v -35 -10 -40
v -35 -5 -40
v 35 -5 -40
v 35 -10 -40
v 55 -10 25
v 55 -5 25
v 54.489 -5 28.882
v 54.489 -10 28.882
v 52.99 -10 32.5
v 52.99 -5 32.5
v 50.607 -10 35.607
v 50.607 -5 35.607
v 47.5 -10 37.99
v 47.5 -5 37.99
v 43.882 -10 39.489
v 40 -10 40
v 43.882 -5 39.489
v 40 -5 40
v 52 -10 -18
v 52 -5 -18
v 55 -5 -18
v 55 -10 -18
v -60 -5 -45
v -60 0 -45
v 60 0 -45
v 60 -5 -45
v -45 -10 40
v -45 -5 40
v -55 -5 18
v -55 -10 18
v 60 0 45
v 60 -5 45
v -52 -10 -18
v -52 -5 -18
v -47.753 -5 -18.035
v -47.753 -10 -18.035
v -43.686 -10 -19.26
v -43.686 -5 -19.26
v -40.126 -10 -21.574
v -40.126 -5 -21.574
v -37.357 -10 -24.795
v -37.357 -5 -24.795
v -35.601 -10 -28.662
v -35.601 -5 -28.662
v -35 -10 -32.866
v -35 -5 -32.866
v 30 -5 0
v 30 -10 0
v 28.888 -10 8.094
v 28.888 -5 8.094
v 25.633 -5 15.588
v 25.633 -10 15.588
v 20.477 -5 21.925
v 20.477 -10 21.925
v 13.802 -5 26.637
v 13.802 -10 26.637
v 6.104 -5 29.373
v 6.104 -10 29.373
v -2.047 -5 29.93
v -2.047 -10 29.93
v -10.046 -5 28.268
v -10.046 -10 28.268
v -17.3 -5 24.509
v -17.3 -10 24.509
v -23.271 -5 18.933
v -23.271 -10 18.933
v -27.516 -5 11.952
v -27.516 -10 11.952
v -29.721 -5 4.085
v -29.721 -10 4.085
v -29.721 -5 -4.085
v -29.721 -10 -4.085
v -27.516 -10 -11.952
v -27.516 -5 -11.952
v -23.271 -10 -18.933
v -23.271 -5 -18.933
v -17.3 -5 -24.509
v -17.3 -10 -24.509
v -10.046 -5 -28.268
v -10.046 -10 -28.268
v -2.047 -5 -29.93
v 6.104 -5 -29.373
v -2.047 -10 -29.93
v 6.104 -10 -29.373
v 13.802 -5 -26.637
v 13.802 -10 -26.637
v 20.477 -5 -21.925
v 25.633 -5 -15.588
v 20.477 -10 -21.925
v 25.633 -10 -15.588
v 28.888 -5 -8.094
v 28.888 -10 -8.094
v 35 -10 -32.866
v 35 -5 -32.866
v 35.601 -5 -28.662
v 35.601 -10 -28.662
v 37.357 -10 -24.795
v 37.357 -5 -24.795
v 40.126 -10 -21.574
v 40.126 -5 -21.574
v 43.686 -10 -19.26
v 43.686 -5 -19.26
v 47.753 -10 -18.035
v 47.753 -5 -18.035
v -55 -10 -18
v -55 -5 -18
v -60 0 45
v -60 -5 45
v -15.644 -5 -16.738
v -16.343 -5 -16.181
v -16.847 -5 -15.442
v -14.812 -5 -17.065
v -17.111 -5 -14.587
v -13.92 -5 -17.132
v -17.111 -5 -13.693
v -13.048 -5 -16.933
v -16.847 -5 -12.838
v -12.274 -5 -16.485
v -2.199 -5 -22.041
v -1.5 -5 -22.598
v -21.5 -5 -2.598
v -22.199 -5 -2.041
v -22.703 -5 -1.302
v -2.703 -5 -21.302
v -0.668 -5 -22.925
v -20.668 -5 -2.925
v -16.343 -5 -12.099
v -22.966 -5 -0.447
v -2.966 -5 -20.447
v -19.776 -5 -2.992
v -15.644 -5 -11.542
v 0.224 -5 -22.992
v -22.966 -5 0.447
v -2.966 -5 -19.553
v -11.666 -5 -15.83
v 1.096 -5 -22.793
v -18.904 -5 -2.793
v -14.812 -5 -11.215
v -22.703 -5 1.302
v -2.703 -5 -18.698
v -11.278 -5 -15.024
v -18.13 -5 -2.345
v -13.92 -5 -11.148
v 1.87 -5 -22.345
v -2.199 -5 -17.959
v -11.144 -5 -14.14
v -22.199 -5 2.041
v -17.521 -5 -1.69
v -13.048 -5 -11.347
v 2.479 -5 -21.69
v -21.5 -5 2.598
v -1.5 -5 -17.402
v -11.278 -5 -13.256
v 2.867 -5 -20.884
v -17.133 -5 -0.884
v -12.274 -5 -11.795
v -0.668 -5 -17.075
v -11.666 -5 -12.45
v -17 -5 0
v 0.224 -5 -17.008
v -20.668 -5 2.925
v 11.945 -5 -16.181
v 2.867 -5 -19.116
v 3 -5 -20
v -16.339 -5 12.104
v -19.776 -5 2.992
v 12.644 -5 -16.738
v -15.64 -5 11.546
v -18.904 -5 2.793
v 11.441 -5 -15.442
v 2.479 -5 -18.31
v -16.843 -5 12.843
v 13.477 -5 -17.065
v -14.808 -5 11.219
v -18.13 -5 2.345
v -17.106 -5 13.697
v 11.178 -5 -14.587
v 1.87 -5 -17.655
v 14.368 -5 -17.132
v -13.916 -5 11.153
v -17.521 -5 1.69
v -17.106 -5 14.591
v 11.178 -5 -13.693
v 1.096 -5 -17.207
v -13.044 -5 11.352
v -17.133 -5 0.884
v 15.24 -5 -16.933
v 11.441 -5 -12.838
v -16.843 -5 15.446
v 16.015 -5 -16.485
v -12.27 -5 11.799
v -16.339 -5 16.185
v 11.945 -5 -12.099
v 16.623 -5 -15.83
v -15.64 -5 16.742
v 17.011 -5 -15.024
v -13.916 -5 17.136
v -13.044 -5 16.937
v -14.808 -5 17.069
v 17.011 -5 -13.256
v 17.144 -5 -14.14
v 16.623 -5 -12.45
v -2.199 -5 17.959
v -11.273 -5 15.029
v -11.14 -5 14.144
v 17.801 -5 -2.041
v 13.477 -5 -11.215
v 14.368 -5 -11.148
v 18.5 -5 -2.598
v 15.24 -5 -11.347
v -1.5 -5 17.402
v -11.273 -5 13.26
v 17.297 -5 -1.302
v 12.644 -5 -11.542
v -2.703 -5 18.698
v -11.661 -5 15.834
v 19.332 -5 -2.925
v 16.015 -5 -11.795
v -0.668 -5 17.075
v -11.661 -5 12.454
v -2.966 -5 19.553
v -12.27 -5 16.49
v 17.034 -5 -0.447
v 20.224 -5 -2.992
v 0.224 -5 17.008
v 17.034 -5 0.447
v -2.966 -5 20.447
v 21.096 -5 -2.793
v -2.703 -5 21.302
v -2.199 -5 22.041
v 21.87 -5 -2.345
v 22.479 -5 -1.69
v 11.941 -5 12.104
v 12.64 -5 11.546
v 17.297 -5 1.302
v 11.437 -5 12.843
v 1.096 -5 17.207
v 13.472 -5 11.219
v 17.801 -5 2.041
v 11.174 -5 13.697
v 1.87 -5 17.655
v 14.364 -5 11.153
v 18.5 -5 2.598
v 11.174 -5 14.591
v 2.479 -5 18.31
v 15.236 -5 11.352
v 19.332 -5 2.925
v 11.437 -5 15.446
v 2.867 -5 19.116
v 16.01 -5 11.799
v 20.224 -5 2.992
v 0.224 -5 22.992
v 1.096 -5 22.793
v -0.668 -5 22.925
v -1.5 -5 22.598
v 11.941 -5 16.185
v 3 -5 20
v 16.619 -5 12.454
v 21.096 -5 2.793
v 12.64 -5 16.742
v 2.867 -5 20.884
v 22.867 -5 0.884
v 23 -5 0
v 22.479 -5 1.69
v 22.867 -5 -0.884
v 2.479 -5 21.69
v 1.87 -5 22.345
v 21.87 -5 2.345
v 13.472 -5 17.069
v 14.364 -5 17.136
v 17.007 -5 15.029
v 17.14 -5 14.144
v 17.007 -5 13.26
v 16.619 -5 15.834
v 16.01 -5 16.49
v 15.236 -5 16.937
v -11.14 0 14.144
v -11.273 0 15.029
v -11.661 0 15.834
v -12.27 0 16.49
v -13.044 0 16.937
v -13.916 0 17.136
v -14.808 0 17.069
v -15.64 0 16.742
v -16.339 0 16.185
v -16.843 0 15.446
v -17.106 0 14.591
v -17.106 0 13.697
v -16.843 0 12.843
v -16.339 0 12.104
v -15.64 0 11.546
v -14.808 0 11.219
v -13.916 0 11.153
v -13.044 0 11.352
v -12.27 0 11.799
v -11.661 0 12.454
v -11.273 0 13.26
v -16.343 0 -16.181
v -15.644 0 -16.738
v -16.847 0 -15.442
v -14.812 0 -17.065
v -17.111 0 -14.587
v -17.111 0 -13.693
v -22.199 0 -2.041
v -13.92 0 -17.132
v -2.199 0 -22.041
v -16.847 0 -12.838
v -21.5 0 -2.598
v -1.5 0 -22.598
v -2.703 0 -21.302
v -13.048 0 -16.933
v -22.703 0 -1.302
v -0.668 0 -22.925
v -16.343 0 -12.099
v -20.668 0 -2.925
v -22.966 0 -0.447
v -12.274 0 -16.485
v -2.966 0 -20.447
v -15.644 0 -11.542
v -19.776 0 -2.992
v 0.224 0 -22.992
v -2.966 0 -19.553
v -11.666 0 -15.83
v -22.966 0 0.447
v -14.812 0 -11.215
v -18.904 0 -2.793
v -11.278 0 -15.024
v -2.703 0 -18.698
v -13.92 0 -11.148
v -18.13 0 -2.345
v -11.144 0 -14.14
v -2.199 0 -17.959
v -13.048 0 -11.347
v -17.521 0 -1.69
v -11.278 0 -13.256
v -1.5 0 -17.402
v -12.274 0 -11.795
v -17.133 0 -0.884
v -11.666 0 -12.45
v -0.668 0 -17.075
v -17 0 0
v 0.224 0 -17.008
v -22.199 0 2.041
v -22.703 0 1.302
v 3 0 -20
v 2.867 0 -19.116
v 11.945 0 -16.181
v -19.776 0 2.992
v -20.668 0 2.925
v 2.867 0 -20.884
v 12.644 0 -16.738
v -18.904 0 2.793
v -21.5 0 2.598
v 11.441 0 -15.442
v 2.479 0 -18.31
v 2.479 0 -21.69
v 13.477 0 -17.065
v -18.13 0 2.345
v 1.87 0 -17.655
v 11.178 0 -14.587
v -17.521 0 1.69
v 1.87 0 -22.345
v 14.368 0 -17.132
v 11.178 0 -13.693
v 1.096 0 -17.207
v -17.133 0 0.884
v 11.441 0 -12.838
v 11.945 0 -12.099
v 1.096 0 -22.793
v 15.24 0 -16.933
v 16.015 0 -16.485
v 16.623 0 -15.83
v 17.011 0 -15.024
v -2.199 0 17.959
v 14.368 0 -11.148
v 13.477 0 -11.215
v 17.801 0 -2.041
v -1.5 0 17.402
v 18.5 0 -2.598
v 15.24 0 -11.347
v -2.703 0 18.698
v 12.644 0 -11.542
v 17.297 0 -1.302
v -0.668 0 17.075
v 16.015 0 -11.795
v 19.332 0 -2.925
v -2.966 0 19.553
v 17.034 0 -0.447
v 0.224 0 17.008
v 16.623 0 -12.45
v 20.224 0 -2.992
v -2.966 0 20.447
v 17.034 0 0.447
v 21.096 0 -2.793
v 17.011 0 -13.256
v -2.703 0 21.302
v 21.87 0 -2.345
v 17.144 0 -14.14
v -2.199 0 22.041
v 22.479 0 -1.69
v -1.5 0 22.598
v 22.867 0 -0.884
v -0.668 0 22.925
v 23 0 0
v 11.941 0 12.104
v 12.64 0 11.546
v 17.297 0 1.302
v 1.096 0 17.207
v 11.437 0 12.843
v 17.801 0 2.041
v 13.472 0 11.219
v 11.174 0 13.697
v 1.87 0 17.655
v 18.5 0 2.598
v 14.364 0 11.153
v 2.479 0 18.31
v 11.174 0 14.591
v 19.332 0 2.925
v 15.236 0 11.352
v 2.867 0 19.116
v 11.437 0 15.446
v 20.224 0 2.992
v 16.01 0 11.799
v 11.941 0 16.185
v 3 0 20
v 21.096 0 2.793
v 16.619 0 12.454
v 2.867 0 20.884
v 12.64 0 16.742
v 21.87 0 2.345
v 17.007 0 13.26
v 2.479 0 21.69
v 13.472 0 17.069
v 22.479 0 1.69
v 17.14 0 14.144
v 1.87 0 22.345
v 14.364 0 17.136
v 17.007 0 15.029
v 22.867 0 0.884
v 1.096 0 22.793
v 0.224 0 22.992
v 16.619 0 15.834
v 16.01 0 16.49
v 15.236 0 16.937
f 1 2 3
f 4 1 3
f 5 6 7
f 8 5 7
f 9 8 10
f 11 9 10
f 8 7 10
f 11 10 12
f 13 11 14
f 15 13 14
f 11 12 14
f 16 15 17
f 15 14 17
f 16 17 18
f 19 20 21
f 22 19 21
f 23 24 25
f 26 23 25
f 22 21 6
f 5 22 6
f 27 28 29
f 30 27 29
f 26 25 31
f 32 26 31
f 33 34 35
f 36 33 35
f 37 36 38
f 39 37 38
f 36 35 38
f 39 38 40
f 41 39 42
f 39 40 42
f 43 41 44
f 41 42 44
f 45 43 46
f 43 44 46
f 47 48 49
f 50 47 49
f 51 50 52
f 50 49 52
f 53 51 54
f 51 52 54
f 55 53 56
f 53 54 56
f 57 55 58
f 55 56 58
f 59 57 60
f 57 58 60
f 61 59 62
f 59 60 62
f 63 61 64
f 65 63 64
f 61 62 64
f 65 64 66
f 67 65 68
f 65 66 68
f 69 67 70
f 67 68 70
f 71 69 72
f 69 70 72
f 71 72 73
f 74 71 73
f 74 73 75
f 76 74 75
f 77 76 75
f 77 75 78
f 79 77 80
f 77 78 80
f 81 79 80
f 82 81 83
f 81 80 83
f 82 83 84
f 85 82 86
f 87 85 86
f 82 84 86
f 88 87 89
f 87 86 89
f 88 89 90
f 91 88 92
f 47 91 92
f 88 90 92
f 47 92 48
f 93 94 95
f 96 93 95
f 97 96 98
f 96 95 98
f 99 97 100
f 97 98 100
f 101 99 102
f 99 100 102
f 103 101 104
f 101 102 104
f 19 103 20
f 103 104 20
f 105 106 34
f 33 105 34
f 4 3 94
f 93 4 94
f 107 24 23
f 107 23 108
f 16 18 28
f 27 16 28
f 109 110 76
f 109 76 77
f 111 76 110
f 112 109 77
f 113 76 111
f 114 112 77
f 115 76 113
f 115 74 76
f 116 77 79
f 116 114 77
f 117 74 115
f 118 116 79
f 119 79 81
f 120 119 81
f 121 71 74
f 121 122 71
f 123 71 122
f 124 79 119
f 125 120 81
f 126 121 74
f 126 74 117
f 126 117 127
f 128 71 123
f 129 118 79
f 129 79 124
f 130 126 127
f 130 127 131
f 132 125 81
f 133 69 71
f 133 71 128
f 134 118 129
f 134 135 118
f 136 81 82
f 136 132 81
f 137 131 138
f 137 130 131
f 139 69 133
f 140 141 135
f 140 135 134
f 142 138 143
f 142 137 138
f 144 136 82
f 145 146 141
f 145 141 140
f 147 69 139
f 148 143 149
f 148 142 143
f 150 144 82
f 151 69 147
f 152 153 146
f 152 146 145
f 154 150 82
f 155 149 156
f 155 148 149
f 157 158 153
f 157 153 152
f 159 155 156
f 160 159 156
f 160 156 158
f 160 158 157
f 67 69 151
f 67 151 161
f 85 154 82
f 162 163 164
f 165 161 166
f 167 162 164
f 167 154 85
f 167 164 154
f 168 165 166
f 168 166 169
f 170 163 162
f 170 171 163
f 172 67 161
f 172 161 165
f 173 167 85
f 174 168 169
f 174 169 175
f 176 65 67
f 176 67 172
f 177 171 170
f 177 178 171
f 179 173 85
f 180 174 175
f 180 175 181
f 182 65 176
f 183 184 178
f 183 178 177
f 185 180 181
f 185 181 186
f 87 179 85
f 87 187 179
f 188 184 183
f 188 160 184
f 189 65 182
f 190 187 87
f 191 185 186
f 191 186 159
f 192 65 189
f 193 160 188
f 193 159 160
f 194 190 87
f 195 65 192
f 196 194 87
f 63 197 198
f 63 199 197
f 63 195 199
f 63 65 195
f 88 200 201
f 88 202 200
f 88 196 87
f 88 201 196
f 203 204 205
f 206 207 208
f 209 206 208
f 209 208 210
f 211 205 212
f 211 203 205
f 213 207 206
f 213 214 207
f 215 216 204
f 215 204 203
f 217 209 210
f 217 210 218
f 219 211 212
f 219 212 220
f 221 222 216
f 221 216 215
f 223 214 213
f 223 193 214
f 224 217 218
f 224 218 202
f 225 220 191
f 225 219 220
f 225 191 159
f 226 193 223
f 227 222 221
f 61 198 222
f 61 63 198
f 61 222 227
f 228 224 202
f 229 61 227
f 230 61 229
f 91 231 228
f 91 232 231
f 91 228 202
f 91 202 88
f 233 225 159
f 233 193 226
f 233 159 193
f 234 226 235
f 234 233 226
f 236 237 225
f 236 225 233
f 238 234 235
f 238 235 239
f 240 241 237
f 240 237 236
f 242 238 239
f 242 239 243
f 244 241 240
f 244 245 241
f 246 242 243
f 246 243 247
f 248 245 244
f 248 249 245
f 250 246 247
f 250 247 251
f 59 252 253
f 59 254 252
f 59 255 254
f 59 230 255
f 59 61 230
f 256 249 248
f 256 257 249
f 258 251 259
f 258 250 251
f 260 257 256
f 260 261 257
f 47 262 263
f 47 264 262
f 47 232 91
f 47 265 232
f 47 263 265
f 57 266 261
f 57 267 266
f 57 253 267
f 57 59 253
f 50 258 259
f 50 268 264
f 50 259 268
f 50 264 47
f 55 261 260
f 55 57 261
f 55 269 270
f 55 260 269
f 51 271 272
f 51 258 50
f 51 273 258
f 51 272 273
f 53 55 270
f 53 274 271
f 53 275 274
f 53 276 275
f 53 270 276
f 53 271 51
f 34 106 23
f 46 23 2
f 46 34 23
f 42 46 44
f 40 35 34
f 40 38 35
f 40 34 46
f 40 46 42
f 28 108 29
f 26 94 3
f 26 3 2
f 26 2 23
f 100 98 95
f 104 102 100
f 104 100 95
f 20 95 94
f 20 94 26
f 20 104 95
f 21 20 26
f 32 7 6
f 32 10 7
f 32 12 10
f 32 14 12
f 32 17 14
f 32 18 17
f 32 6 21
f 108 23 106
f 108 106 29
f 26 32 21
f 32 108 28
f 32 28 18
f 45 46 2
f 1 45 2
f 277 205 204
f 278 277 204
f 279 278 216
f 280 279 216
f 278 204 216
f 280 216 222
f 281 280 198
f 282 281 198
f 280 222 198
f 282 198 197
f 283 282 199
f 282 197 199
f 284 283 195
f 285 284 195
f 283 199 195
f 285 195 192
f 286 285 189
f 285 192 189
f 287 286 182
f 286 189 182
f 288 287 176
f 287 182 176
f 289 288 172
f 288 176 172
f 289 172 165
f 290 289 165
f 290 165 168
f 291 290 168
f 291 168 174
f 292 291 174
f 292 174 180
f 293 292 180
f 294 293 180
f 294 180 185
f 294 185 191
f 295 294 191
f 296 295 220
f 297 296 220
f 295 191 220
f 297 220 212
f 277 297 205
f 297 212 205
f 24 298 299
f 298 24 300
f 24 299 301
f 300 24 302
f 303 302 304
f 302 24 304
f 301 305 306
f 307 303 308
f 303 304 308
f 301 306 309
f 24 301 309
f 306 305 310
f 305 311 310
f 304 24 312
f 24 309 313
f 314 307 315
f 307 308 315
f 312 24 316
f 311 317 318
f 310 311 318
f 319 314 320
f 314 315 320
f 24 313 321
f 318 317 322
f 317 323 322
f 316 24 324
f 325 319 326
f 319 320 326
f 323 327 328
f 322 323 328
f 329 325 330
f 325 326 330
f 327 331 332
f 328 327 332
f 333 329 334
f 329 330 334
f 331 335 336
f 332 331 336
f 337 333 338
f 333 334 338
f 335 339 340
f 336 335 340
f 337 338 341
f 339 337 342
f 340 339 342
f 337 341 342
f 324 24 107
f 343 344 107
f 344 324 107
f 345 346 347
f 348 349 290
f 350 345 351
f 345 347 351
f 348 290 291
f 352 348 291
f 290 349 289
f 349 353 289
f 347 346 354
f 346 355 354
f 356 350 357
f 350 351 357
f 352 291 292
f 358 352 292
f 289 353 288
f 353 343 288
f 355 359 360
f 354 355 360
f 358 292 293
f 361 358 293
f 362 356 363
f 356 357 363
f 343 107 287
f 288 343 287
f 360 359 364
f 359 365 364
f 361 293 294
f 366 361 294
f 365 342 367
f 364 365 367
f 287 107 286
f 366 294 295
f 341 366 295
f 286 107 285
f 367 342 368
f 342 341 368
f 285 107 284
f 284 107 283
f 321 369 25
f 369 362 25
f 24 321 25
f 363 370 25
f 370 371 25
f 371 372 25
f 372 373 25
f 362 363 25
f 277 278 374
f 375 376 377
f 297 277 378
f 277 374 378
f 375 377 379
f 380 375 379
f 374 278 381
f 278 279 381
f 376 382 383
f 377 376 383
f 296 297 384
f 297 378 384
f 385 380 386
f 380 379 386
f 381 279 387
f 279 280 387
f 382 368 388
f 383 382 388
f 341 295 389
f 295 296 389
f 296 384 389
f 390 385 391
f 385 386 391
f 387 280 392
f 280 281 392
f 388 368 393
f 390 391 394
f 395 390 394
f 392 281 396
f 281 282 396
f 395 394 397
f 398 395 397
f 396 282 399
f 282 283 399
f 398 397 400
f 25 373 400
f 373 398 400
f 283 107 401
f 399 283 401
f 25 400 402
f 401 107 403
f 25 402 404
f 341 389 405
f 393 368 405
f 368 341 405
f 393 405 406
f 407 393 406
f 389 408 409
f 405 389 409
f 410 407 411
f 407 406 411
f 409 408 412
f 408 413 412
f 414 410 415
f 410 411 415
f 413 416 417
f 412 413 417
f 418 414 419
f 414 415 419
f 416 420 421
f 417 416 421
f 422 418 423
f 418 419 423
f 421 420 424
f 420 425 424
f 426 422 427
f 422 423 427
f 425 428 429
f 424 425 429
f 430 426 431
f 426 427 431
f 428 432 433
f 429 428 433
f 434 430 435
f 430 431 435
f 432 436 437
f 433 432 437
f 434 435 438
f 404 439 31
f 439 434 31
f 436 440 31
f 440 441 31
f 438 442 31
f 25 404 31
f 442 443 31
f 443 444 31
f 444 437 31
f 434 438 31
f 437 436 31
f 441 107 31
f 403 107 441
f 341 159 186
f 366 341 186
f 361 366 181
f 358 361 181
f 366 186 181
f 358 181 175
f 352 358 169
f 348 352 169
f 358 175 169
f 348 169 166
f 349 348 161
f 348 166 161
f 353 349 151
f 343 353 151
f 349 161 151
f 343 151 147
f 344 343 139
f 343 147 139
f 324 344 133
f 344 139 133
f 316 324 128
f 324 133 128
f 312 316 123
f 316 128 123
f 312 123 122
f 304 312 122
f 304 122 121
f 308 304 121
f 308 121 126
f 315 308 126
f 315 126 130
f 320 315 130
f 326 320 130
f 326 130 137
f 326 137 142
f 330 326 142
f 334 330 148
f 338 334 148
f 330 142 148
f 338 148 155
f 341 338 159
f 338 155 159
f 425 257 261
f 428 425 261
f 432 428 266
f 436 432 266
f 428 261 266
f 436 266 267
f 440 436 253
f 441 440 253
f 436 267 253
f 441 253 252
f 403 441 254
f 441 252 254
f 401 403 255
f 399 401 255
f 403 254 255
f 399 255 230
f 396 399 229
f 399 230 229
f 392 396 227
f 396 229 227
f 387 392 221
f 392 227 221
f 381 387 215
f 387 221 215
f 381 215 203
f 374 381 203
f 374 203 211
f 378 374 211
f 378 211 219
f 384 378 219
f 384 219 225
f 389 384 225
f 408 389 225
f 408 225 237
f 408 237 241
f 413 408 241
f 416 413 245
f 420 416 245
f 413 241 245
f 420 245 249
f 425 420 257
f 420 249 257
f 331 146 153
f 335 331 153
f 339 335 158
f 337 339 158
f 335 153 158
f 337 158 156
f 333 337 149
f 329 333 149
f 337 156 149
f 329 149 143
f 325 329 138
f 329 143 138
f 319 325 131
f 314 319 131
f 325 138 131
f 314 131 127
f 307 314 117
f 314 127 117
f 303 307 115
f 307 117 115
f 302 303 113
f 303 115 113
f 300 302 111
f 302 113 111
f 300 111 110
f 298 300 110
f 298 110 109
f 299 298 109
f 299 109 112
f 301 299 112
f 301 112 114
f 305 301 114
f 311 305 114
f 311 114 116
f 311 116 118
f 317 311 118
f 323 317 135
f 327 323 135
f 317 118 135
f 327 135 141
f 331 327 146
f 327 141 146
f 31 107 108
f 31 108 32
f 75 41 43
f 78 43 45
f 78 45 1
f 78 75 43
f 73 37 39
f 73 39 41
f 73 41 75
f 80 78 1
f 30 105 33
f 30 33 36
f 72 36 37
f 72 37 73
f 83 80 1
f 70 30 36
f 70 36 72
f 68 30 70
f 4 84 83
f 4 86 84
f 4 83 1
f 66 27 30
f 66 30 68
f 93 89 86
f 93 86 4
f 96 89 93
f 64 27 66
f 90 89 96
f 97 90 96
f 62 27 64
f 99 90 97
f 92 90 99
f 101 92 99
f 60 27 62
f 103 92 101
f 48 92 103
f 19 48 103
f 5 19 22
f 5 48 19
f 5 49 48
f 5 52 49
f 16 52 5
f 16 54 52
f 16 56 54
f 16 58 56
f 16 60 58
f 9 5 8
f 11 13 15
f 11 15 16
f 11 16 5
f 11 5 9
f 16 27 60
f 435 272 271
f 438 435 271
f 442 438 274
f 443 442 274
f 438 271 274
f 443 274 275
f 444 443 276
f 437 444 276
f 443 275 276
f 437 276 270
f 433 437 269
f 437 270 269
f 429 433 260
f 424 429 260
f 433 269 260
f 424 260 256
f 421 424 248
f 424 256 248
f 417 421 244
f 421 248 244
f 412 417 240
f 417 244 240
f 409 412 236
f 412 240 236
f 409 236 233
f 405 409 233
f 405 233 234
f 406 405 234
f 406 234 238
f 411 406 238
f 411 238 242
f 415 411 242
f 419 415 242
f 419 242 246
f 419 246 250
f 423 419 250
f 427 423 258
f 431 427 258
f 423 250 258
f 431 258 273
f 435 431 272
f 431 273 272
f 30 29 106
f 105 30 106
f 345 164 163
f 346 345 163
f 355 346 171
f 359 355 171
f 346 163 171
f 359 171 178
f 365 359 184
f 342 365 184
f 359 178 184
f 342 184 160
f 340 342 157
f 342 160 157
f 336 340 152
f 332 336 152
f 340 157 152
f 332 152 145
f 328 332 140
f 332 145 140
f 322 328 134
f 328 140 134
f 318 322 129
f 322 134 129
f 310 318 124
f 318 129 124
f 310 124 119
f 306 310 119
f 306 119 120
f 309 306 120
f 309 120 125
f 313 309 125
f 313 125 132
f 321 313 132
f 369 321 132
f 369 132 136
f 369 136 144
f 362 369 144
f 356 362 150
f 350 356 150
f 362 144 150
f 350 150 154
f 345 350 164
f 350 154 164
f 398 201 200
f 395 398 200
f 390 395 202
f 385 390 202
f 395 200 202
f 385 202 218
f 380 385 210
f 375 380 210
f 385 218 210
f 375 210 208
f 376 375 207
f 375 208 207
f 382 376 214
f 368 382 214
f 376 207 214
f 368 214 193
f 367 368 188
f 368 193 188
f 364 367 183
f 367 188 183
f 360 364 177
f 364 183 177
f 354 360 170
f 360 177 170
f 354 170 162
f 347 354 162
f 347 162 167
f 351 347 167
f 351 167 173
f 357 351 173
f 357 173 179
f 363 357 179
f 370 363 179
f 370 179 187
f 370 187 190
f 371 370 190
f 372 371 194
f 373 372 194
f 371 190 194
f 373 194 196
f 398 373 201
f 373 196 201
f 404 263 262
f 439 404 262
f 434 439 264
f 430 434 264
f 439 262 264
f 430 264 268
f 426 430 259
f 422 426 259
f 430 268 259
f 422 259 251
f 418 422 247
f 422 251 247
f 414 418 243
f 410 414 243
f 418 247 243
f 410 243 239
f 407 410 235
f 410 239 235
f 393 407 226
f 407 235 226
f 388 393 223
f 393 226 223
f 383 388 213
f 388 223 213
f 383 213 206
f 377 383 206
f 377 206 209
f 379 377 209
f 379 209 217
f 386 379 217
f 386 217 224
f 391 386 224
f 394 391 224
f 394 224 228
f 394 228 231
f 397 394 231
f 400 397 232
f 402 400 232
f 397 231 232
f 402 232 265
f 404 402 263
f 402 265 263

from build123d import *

# Parameters (mm, degrees)
F0_W     = 120
F0_H     = 90
F1_DEPTH = 5
F3_DEPTH = 5
F4_R     = 30
F5_DEPTH = 5
F6_R     = 3
F7_DEPTH = 5


with BuildPart() as f1:
    # F0 (on Front) → F1 (new body)
    with BuildSketch(Plane.XZ):
        Rectangle(F0_W, F0_H)
    extrude(amount=F1_DEPTH)

    # F2 (on face) → F3 (join)
    with BuildSketch(Plane.XZ.offset(5)):
        with BuildLine():
            Line((-45, 40), (-55, 18))
            Line((-55, 18), (-55, -18))
            Line((-55, -18), (-52, -18))
            ThreePointArc((-52, -18), (-40.125791, -21.574479), (-35, -32.866069))
            Line((-35, -32.866069), (-35, -40))
            Line((-35, -40), (35, -40))
            Line((35, -40), (35, -32.866069))
            ThreePointArc((35, -32.866069), (40.125791, -21.574479), (52, -18))
            Line((52, -18), (55, -18))
            Line((55, -18), (55, 25))
            ThreePointArc((55, 25), (50.606602, 35.606602), (40, 40))
            Line((40, 40), (-45, 40))
        make_face()
    extrude(amount=F3_DEPTH)

    # F4 (on face) → F5 (cut)
    with BuildSketch(Plane.XZ.offset(10)):
        Circle(F4_R)
    extrude(amount=-F5_DEPTH, mode=Mode.SUBTRACT)

    # F6 (on face) → F7 (cut)
    with BuildSketch(Plane.XZ.offset(5)):
        with Locations((-14.14, 14.144271)):
            Circle(F6_R)
        with Locations((0, 20)):
            Circle(F6_R)
        with Locations((14.14, 14.144271)):
            Circle(F6_R)
        with Locations((20, 0)):
            Circle(F6_R)
        with Locations((14.144271, -14.14)):
            Circle(F6_R)
        with Locations((0, -20)):
            Circle(F6_R)
        with Locations((-14.144271, -14.14)):
            Circle(F6_R)
        with Locations((-20, 0)):
            Circle(F6_R)
    extrude(amount=-F7_DEPTH, mode=Mode.SUBTRACT)


solid = f1.part
